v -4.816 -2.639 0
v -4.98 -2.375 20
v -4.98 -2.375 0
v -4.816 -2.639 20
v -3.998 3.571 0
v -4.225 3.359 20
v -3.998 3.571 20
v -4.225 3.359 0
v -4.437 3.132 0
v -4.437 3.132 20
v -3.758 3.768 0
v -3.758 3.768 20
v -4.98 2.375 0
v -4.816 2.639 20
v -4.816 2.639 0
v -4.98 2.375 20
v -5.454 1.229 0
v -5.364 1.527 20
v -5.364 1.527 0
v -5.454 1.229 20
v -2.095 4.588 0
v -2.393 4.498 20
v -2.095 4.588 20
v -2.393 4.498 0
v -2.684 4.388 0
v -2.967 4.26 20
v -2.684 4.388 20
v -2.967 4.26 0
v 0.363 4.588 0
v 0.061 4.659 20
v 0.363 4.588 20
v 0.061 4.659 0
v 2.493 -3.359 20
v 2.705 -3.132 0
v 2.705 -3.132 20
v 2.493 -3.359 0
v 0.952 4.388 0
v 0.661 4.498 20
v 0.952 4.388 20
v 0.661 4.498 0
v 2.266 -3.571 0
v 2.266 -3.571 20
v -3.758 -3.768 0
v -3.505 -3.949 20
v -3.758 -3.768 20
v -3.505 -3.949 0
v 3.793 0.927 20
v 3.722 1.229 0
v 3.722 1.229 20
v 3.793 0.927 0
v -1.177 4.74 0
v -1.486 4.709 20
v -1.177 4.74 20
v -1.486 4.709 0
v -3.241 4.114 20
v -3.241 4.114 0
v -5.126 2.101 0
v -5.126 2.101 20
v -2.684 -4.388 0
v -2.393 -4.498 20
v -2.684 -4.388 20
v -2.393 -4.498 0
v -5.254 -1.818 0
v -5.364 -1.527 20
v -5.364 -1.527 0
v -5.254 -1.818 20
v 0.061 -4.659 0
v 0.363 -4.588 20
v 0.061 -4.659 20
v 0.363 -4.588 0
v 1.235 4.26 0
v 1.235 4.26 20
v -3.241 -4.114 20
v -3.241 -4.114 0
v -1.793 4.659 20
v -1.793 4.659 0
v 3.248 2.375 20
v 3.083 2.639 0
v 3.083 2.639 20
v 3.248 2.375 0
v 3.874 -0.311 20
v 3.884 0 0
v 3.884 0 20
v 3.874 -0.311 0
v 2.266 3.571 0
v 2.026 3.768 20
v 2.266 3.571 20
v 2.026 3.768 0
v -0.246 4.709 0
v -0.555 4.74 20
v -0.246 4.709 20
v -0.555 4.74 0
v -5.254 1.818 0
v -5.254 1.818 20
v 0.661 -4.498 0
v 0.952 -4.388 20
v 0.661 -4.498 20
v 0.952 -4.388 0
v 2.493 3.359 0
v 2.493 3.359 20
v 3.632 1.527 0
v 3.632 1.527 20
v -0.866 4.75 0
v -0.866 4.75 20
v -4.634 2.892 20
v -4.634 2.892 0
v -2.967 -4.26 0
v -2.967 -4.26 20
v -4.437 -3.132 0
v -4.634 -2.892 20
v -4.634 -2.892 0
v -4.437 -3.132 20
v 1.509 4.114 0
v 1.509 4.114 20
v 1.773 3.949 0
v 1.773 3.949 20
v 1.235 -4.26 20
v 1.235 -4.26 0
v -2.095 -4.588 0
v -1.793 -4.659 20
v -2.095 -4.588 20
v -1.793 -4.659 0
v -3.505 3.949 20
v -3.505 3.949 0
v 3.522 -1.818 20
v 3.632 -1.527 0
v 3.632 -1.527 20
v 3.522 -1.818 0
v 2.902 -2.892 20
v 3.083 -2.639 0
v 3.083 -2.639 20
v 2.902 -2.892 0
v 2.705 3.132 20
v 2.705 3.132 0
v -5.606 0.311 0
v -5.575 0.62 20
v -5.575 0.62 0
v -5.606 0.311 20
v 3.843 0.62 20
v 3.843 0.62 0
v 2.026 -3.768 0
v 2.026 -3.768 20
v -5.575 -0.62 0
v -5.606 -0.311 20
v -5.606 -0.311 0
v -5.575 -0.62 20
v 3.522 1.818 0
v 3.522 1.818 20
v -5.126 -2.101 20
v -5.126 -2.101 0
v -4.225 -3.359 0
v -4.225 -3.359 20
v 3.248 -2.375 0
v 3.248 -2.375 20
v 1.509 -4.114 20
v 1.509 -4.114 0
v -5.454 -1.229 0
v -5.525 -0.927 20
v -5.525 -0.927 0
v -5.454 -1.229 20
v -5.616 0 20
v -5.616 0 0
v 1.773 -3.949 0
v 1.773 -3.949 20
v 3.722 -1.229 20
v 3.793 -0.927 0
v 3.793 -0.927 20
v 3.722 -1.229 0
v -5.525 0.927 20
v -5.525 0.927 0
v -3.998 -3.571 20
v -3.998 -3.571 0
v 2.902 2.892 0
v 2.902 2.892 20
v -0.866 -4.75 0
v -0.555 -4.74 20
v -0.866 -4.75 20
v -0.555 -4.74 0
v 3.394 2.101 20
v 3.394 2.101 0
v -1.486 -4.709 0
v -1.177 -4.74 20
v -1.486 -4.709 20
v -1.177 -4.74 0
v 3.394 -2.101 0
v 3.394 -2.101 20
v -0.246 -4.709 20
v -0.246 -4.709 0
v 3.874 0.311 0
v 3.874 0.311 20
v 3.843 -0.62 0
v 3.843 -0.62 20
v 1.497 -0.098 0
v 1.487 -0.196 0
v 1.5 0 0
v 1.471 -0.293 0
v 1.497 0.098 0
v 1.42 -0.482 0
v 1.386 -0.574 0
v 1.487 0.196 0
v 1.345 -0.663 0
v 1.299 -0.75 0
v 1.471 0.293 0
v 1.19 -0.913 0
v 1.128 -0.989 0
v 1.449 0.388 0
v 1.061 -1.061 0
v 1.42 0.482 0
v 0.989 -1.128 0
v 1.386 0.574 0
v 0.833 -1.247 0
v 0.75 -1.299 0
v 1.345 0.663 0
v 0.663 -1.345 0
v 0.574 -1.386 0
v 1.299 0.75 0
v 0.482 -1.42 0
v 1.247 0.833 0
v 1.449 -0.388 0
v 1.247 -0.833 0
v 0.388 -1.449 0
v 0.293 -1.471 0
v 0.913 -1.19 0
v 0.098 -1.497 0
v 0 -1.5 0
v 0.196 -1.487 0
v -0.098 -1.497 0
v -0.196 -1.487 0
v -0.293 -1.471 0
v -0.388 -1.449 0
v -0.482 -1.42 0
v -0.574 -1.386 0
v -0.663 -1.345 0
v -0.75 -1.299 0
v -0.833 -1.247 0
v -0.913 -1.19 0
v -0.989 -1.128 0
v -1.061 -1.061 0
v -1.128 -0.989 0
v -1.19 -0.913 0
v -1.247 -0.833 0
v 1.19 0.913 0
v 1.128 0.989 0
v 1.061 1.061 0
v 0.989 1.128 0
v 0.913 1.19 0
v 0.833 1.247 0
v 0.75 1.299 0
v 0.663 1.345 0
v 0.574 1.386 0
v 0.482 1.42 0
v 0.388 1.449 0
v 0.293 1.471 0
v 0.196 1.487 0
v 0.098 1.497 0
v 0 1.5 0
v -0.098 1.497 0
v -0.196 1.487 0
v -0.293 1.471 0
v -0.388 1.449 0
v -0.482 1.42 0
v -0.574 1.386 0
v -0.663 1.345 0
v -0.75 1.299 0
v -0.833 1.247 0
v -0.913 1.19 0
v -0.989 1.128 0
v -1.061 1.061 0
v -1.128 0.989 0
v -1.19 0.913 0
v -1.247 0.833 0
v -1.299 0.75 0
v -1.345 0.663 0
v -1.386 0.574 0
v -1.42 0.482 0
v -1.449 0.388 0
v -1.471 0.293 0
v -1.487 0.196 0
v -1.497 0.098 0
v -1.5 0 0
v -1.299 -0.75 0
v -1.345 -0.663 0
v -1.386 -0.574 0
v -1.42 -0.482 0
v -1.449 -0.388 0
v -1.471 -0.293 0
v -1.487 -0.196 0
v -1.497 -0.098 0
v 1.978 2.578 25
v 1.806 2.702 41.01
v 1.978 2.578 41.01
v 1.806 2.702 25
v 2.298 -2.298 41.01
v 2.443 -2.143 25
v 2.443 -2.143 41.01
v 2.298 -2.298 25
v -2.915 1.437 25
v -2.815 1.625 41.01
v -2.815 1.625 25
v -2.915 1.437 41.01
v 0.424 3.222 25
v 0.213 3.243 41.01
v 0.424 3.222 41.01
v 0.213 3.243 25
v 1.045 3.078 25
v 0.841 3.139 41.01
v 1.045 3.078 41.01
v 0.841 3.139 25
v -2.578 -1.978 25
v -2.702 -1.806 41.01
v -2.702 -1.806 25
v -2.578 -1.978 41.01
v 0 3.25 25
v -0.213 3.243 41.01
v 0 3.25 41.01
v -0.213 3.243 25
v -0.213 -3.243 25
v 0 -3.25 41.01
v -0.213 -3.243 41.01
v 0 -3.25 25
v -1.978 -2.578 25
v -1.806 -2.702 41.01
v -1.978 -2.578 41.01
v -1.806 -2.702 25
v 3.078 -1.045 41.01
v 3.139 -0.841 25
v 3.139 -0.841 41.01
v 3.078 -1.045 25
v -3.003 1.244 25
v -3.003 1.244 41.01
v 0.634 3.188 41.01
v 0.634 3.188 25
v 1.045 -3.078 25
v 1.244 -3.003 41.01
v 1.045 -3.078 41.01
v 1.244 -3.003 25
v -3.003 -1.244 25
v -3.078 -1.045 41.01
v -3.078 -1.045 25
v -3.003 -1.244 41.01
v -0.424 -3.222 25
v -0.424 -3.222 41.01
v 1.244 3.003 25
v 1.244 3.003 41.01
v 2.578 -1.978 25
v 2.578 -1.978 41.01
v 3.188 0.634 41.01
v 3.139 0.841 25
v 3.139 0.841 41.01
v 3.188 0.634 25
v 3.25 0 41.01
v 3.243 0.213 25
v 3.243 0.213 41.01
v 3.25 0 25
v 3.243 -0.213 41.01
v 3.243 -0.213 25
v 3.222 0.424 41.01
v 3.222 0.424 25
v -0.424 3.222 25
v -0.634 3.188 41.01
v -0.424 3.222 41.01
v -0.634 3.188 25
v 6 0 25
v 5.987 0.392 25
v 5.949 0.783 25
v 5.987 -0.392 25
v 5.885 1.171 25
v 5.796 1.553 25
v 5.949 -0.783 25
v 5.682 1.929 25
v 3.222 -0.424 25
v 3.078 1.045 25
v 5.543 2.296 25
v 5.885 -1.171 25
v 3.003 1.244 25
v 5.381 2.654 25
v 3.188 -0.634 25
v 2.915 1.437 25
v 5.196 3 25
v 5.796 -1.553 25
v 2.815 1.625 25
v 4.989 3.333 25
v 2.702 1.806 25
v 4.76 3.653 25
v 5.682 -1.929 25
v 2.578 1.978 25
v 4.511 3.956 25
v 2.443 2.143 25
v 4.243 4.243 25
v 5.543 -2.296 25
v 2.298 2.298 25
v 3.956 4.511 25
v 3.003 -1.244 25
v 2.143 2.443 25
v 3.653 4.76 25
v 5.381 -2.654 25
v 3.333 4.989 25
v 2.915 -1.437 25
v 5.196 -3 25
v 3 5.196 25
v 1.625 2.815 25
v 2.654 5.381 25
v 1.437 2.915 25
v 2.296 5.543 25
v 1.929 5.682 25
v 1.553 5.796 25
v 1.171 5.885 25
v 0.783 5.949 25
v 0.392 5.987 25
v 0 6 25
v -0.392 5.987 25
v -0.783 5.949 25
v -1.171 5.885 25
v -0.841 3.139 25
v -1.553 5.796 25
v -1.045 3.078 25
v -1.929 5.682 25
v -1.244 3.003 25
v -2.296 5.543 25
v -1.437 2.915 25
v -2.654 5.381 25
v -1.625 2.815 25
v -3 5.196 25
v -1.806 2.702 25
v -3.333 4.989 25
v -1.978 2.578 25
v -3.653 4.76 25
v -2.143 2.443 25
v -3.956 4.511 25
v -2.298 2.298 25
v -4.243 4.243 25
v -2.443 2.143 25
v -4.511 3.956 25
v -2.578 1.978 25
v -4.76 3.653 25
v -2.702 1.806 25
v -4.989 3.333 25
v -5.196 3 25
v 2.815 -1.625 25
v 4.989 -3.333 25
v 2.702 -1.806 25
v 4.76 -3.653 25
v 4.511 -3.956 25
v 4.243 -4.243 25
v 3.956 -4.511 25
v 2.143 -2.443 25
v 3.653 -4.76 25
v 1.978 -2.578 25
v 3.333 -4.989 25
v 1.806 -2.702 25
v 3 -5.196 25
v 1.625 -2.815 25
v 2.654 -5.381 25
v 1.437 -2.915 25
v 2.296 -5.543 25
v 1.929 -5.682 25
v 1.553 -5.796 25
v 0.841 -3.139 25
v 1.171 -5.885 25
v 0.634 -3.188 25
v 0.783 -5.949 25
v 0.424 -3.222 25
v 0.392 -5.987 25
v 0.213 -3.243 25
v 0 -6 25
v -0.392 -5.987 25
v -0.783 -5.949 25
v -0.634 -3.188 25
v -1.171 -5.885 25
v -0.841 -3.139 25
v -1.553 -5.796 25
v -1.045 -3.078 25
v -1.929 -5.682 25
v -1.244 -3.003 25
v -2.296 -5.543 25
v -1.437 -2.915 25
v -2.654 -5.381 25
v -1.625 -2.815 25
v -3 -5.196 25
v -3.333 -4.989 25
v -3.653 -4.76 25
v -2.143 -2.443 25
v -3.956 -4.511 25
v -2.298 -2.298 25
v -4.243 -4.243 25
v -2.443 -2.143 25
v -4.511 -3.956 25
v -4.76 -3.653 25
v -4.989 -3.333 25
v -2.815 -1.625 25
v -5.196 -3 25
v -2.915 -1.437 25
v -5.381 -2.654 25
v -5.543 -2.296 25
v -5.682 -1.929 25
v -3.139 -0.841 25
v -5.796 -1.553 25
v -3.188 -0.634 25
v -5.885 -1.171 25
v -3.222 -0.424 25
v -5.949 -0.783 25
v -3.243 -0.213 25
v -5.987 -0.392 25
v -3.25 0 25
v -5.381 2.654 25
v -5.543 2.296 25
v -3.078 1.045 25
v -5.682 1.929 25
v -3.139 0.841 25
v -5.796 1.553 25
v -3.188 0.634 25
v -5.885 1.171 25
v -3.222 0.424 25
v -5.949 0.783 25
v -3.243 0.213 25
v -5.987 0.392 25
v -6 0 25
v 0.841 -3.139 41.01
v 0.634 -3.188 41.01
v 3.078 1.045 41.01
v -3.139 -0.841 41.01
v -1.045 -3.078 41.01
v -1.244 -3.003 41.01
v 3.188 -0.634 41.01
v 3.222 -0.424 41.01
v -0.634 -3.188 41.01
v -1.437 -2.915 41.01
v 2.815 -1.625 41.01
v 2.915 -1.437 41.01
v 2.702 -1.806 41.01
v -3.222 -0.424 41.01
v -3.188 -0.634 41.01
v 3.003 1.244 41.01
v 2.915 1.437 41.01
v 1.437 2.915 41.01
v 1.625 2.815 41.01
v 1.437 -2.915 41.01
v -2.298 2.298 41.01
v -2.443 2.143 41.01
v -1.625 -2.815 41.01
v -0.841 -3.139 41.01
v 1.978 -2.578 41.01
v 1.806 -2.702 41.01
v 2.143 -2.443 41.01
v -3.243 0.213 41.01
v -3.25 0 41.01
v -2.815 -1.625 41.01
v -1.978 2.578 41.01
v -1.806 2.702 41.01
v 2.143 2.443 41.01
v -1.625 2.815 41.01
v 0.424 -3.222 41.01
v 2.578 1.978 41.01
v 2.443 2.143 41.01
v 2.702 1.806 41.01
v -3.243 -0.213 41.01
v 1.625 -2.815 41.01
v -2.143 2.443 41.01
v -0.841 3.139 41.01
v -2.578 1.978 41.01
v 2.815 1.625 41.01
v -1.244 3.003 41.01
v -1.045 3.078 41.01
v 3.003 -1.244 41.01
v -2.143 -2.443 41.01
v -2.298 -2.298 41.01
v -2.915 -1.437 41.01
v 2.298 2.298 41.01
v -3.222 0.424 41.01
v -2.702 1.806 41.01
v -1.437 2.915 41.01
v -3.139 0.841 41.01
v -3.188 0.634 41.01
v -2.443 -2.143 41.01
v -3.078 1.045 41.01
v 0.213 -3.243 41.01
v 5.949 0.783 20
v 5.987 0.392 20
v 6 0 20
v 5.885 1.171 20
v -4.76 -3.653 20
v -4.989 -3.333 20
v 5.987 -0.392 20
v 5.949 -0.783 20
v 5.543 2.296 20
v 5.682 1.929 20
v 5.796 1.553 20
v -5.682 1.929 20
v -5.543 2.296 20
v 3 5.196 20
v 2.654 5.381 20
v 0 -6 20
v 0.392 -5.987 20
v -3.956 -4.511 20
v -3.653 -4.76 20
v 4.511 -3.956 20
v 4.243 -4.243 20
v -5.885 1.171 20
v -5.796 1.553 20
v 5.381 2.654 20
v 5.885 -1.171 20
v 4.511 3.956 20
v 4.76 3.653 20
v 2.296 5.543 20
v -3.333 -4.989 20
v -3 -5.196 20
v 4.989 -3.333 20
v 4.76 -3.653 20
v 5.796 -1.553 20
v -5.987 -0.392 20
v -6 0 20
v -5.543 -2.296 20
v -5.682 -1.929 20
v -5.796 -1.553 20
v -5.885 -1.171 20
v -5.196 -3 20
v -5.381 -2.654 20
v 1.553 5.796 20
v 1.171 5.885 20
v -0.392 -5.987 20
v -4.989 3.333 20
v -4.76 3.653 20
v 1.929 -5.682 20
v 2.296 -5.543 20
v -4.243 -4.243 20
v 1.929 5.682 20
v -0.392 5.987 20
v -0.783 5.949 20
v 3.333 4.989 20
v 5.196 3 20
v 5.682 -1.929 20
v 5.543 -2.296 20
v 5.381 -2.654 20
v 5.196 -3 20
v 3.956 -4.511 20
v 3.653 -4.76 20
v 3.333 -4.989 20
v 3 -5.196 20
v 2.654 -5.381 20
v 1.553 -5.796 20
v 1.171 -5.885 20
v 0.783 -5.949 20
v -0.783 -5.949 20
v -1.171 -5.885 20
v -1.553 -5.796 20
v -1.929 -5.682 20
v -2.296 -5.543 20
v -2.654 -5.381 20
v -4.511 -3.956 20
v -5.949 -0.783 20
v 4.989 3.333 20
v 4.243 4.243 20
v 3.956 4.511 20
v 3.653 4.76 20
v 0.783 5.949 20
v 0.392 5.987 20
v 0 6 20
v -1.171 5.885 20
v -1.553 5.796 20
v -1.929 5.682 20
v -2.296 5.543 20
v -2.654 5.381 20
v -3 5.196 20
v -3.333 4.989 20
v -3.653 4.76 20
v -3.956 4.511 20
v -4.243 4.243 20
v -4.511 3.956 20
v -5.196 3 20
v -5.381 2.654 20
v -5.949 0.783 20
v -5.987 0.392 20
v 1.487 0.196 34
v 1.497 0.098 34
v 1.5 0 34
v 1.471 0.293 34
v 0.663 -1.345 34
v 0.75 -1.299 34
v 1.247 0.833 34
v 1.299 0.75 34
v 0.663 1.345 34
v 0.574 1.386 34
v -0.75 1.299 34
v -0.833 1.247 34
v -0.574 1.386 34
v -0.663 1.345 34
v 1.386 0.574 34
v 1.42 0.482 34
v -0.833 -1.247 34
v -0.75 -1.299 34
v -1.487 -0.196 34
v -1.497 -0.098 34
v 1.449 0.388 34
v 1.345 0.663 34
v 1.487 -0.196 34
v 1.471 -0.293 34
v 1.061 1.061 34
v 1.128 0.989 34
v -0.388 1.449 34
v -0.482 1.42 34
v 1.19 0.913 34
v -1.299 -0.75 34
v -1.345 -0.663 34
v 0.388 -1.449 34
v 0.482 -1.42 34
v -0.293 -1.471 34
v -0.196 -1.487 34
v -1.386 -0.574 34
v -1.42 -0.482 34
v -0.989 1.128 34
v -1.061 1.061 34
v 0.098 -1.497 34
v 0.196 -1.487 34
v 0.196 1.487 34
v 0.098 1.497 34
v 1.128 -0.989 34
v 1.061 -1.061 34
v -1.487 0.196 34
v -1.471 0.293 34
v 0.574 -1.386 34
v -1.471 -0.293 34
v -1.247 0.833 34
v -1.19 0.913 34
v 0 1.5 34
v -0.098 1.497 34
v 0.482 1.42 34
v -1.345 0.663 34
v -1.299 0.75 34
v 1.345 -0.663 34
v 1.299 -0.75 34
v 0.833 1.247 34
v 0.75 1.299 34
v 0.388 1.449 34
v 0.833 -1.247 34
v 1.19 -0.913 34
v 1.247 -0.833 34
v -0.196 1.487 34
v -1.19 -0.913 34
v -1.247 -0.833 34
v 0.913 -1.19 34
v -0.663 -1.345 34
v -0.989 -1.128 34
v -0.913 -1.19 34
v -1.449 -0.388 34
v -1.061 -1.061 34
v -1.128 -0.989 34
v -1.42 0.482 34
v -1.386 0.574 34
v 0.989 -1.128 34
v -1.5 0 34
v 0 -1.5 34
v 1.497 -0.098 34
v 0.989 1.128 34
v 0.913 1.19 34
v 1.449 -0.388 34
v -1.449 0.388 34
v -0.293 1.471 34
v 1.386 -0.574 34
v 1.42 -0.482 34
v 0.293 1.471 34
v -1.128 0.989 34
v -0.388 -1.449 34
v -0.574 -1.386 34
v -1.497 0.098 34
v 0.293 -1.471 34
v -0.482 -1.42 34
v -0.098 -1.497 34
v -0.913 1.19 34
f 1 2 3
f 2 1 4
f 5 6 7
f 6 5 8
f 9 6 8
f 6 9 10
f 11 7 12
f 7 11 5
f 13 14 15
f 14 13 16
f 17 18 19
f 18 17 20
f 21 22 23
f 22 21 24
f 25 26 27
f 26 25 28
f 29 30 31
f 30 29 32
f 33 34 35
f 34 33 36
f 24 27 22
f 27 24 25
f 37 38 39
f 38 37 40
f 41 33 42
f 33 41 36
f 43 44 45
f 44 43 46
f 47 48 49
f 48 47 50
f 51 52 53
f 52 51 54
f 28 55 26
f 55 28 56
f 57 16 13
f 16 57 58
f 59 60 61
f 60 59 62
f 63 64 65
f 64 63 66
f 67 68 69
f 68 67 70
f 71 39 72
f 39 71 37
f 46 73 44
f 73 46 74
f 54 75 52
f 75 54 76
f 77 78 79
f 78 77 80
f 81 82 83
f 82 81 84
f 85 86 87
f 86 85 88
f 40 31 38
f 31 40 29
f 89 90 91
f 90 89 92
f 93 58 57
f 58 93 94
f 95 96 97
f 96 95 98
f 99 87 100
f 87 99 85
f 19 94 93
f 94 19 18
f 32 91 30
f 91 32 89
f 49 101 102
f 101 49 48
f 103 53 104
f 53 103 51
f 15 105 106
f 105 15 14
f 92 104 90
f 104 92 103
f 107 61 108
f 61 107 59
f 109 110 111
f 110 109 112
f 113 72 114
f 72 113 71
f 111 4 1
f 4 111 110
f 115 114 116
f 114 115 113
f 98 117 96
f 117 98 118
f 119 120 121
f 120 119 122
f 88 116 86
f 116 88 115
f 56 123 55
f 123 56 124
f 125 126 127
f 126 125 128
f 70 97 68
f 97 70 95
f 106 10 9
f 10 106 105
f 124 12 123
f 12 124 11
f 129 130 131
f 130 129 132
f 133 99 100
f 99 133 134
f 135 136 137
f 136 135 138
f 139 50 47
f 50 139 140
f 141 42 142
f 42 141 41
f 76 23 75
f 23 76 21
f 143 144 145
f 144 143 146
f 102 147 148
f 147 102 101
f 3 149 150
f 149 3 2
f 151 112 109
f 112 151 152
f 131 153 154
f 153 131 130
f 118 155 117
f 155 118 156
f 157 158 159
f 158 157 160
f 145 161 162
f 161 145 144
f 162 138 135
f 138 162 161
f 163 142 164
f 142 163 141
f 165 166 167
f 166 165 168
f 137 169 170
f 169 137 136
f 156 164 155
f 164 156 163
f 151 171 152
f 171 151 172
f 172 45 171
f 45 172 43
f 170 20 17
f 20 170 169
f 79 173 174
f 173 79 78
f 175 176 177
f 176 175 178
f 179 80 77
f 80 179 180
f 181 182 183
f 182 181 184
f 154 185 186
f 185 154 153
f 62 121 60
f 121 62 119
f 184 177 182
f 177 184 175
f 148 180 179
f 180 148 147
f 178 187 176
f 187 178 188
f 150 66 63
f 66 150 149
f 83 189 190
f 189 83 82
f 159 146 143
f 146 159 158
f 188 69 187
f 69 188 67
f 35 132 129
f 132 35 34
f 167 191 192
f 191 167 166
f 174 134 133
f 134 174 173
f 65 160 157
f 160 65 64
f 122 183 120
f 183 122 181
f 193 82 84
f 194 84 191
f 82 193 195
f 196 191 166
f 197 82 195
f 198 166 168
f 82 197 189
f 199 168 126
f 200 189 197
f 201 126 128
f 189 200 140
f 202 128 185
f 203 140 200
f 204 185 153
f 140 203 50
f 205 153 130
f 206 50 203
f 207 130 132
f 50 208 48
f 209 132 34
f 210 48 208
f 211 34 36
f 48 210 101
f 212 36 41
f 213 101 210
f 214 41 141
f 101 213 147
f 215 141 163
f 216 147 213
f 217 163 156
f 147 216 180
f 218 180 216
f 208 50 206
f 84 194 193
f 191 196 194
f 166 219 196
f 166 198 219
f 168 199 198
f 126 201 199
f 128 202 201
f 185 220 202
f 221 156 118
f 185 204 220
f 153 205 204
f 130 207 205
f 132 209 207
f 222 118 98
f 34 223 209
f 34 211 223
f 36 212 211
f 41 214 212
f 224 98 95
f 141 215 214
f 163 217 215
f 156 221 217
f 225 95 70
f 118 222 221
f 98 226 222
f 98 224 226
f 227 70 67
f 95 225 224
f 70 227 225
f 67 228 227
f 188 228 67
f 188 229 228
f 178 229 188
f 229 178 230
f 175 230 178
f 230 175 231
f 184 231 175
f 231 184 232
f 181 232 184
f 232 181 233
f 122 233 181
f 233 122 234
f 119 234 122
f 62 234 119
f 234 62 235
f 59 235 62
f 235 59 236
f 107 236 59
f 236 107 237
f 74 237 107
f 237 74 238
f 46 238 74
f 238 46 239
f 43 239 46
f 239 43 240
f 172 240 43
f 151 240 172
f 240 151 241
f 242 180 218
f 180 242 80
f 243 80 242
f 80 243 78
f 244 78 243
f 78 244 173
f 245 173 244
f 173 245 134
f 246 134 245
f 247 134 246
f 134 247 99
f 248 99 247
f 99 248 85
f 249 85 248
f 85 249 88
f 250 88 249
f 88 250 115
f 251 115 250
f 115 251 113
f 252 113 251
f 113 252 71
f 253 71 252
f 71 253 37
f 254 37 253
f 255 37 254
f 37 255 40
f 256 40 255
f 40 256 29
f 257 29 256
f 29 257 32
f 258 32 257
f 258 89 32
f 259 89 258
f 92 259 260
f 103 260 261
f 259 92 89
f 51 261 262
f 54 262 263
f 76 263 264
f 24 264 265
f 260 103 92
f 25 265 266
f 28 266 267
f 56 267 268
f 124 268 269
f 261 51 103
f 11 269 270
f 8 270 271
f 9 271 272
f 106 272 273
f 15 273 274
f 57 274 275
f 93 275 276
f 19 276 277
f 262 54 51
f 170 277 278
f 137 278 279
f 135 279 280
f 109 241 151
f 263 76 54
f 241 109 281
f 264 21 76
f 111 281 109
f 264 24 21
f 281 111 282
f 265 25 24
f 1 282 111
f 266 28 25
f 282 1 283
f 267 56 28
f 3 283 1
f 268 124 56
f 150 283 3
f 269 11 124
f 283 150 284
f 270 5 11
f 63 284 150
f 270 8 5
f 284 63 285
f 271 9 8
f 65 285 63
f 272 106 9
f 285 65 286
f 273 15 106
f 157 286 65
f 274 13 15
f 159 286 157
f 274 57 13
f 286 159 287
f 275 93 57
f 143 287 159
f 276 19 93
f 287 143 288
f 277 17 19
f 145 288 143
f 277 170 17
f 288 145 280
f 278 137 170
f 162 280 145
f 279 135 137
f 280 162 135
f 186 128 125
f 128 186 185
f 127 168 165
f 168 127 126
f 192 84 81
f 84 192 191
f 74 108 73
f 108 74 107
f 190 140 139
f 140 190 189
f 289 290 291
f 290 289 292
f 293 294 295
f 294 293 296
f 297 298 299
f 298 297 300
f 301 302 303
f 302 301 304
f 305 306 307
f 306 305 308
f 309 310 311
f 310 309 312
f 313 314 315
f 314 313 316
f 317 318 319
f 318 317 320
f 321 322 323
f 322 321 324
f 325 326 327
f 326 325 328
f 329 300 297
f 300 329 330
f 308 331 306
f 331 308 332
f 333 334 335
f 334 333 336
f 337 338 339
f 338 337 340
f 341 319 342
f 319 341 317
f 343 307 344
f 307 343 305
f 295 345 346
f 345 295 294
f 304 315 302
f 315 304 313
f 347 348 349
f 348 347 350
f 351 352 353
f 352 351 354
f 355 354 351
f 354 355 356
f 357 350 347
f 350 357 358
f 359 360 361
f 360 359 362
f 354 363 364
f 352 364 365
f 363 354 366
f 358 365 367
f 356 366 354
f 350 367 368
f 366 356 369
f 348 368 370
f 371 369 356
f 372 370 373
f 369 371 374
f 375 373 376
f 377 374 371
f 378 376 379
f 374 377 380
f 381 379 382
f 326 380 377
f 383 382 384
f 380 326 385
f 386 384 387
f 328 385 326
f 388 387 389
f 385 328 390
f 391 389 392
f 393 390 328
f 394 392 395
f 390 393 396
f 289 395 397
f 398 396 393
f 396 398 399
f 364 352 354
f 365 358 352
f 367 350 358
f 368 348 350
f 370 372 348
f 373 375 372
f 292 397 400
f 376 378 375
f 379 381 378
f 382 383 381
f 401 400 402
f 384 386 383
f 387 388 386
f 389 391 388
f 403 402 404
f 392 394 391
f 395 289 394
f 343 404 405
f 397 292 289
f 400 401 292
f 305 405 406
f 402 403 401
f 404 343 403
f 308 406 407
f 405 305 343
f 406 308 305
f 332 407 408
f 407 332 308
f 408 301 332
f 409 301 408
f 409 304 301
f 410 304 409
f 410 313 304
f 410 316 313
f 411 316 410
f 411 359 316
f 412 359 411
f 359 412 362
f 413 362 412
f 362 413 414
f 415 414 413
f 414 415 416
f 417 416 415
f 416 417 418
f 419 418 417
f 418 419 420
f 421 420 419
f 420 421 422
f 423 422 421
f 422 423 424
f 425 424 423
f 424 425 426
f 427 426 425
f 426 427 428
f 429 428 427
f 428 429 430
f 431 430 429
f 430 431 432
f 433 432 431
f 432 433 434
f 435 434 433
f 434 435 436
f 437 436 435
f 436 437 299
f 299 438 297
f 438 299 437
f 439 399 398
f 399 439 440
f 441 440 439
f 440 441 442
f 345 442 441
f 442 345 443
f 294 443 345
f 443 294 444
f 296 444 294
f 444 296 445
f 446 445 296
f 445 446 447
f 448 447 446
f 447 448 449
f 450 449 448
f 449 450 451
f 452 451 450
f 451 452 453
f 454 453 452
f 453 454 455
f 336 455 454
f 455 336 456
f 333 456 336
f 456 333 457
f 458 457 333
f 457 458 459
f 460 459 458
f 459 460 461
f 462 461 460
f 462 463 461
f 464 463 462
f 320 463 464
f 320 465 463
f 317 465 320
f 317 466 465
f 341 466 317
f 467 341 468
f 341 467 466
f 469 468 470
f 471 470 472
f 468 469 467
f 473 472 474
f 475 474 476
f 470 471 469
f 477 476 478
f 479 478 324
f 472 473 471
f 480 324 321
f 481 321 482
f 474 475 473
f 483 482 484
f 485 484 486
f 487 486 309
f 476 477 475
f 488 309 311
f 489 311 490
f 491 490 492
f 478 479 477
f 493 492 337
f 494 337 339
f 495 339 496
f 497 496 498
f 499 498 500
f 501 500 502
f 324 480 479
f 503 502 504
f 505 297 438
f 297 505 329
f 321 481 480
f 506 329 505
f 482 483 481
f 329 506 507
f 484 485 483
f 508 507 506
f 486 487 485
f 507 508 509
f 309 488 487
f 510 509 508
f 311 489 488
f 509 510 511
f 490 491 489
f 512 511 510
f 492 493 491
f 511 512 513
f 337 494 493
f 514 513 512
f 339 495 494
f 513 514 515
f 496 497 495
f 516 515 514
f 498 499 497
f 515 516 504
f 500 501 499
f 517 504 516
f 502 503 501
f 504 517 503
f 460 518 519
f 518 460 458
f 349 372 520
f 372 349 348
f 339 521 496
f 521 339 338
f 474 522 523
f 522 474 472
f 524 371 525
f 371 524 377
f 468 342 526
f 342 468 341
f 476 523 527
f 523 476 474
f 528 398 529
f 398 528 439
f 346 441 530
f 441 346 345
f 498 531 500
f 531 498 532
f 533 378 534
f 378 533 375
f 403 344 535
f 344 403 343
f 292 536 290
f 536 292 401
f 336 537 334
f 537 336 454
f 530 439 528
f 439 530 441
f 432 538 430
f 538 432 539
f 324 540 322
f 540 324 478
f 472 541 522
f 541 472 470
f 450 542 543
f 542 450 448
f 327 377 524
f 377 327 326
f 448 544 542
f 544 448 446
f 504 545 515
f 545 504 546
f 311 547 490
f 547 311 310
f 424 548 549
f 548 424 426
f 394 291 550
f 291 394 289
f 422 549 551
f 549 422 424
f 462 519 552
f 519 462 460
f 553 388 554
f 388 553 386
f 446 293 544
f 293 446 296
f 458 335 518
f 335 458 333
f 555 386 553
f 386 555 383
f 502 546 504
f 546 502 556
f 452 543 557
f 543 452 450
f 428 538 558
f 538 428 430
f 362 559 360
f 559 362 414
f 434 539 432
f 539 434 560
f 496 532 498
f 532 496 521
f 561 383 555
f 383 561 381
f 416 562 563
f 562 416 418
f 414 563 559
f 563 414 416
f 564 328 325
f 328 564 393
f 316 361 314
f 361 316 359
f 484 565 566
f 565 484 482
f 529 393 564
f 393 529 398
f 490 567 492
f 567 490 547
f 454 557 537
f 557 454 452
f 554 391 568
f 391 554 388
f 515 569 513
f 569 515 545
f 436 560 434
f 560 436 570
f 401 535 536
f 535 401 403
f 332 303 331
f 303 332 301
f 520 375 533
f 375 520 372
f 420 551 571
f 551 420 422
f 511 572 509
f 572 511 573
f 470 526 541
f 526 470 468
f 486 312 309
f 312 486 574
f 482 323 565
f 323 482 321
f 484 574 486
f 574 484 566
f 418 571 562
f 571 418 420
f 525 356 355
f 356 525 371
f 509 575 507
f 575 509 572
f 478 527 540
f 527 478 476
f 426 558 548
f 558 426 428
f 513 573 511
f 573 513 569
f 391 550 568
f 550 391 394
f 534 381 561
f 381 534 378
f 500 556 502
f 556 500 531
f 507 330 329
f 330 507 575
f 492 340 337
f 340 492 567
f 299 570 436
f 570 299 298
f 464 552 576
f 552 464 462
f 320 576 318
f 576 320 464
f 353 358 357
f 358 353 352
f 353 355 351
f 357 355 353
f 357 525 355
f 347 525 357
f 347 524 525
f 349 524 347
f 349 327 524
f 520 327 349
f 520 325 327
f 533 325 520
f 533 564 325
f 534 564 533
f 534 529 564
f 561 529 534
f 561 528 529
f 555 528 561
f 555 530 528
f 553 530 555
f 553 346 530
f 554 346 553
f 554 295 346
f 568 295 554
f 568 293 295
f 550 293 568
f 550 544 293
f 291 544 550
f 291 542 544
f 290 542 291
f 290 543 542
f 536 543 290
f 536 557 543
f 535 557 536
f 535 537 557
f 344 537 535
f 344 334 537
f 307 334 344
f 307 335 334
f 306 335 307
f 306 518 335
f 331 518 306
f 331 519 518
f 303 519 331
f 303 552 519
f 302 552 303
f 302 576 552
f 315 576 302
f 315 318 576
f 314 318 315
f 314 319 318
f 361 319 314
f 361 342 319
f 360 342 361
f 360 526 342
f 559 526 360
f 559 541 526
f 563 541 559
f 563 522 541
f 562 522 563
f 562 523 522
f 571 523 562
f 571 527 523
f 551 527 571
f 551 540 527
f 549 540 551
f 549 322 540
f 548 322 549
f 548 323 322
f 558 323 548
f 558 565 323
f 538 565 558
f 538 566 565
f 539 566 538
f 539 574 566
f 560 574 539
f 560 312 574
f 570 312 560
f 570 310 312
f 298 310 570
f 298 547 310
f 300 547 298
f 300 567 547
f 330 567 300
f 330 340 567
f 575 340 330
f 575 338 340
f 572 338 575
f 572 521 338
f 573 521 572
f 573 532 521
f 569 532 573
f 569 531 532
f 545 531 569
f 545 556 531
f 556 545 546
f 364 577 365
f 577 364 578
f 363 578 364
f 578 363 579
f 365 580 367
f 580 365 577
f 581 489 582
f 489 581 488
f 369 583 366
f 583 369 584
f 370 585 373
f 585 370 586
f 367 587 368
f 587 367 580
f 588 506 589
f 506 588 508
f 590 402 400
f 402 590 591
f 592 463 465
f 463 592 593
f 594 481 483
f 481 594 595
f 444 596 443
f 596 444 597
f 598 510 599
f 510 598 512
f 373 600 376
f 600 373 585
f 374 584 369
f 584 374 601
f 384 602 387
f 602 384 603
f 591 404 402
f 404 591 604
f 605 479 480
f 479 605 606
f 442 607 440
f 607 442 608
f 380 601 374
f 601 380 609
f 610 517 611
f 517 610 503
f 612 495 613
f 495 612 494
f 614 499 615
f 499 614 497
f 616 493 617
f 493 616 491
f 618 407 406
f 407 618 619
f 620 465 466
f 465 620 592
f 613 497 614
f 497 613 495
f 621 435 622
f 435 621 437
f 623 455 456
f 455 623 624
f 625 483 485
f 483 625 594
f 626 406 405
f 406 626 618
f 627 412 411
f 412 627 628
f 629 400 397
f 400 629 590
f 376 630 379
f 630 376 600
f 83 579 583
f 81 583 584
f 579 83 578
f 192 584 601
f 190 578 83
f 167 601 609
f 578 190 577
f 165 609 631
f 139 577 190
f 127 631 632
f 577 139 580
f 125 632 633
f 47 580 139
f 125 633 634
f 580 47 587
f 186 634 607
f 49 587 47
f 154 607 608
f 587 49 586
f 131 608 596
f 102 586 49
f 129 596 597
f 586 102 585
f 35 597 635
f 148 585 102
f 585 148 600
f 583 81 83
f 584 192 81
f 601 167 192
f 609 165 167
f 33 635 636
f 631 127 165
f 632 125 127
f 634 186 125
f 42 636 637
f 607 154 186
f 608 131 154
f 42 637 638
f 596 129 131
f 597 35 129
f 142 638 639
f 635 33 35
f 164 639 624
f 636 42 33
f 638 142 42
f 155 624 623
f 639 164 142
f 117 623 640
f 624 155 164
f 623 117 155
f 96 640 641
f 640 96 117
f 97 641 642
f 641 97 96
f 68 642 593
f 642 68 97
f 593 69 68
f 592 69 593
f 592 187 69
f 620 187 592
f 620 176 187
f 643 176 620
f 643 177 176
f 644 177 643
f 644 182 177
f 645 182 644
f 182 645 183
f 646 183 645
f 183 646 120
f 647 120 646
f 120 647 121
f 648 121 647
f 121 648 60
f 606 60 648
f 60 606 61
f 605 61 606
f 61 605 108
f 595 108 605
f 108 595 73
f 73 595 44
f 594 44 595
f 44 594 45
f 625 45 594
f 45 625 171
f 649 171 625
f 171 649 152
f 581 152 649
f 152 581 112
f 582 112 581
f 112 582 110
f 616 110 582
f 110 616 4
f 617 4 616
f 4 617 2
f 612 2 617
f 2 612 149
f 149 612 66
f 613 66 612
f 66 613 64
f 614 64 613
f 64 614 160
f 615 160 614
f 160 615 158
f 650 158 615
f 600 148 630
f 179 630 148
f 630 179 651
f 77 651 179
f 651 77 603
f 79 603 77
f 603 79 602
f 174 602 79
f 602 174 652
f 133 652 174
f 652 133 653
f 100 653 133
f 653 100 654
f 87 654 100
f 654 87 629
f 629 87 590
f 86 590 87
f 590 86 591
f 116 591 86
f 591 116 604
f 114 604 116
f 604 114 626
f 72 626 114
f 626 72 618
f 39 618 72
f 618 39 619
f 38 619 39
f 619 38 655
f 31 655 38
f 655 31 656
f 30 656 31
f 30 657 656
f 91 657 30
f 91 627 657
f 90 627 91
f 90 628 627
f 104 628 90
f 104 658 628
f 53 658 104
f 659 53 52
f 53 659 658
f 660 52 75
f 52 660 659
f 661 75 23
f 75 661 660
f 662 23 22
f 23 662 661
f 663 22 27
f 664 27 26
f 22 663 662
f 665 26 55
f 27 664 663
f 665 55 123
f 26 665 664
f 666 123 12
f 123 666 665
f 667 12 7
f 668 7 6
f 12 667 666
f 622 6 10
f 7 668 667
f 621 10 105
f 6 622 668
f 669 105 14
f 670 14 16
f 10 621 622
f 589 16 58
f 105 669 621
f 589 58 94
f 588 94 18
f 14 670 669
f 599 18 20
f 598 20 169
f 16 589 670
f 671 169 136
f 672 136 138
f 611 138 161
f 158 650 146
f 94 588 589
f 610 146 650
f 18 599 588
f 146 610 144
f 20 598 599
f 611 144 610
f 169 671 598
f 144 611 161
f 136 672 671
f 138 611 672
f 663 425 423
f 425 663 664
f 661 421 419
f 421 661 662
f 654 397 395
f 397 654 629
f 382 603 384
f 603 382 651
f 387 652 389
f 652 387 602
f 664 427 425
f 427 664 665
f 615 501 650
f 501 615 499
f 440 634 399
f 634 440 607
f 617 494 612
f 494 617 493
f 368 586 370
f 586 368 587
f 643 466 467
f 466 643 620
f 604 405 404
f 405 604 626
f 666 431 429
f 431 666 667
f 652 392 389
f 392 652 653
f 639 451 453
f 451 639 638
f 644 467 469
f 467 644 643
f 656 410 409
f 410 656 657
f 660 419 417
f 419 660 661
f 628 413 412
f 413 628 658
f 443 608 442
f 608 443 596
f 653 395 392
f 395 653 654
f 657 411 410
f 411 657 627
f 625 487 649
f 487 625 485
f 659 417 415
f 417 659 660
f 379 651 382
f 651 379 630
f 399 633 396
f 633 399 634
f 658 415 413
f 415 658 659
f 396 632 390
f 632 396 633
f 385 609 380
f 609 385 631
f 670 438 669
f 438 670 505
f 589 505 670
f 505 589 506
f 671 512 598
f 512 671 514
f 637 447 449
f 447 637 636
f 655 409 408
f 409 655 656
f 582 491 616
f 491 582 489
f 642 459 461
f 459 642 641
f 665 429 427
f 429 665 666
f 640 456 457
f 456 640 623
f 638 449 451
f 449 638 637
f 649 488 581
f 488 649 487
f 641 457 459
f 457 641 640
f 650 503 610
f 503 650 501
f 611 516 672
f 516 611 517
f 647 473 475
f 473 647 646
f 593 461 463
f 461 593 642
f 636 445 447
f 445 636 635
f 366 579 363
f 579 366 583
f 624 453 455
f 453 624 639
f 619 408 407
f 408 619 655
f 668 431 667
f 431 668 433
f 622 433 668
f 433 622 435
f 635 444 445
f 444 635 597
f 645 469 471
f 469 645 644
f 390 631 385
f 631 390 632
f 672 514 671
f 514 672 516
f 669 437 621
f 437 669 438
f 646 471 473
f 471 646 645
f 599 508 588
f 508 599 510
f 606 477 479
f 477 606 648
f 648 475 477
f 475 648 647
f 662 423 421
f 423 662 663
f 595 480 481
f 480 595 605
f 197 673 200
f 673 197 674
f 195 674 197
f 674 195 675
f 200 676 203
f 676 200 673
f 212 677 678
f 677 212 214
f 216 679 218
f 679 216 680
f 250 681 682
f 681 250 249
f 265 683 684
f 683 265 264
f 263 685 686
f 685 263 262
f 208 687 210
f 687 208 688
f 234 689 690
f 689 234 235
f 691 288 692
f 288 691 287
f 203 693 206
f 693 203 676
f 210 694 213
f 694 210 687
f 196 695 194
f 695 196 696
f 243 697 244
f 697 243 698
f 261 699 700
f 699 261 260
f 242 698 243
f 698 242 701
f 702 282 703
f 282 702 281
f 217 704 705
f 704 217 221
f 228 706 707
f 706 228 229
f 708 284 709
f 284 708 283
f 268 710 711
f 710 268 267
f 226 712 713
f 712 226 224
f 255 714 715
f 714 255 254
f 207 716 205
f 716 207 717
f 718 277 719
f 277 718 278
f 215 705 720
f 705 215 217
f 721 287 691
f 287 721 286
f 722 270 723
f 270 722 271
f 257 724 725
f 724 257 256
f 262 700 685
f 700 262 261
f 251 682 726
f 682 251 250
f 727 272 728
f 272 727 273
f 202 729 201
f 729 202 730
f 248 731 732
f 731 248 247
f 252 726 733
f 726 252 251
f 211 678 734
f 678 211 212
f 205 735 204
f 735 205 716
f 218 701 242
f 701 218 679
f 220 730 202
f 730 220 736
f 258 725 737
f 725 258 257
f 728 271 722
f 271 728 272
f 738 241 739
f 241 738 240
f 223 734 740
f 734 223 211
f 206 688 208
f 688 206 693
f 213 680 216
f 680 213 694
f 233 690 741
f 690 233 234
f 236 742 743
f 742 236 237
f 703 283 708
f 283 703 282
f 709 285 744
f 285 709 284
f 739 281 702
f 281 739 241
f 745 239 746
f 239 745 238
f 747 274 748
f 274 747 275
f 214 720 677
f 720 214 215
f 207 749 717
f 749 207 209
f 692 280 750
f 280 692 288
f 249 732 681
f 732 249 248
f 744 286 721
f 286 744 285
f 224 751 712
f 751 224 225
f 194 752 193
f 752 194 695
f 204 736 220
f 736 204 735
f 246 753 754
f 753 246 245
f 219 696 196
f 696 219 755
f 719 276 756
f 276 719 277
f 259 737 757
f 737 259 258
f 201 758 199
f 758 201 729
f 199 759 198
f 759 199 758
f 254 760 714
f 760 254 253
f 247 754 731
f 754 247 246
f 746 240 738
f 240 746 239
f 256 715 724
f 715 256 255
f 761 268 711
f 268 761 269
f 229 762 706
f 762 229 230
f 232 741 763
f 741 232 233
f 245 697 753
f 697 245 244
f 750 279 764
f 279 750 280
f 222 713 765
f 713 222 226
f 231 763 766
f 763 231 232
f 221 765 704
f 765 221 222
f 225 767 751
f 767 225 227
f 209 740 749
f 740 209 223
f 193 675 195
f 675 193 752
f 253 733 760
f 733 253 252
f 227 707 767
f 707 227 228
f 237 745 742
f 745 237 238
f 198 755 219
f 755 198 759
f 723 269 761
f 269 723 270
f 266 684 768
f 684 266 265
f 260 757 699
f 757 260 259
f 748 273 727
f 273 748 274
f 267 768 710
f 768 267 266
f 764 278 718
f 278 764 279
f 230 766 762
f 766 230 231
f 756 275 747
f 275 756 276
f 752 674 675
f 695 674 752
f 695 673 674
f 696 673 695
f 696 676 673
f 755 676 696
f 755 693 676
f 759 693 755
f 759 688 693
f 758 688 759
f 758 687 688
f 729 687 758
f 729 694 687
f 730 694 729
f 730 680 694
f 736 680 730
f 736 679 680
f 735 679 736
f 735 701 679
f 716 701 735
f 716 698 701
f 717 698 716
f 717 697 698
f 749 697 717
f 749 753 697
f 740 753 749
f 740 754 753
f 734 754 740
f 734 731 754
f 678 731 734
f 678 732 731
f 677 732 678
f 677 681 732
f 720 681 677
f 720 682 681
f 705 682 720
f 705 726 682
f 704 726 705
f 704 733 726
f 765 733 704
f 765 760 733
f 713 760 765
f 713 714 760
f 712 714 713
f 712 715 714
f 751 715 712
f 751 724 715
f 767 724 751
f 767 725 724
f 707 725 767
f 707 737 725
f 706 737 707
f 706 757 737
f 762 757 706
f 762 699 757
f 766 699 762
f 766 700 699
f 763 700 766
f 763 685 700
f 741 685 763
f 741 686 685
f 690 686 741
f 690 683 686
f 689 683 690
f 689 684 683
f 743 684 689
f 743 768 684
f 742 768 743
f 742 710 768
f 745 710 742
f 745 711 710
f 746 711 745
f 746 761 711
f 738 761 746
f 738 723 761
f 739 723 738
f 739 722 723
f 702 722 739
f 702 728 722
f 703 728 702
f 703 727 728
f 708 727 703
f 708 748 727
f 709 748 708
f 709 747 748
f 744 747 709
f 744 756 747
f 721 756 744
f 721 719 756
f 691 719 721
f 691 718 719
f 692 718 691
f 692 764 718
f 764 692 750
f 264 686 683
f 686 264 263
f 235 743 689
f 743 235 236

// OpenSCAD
// Hose-barb reducer: joins 8 mm ID tubing to 5 mm ID tubing
// Print orientation: standing upright along Z

$fn = 96;

// ---- 8 mm tubing barbs (z = 0 to 20) ----
barb_h_8 = 20;
barb_od_bottom_8 = 7.5;
barb_od_top_8 = 9.5;

// ---- 5 mm tubing barbs (z = 25 to 41) ----
barb_h_5 = 8;
barb_od_bottom_5 = 6.5;
barb_od_top_5 = 5.0;

// ---- Collar (z = 20 to 25) ----
collar_od = 12;

// ---- Through bore ----
bore = 3;

// ---- Derived ----
collar_h = 5;
overlap = 0.01;

module barb(h, od_bottom, od_top) {
    // Sawtooth profile: grow linearly, then step straight back to bottom diameter
    len = (od_top - od_bottom) / 2 / tan(30);  // 30 deg flank
    hull() {
        translate([0, 0, 0]) cylinder(h = h + overlap, d = od_bottom);
        translate([0, 0, h - overlap]) cylinder(h = overlap, d = od_bottom);
        for (s = [-1, 1])
            rotate([0, 0, s * 180])
                translate([len / 2, 0, 0])
                    linear_extrude(height = h + overlap)
                        circle(d = od_top);
    }
}

difference() {
    union() {
        // 8 mm barbs
        for (z = [0, barb_h_8 / 2])
            translate([0, 0, z]) barb(h = barb_h_8 / 2 + overlap, od_bottom = barb_od_bottom_8, od_top = barb_od_top_8);

        // Collar
        translate([0, 0, 20]) cylinder(h = collar_h, d = collar_od);

        // 5 mm barbs
        for (z = [25, 41 - 16 / 2])
            translate([0, 0, z]) barb(h = barb_h_5, od_bottom = barb_od_bottom_5, od_top = barb_od_top_5);
    }

    // Through bore
    translate([0, 0, -1]) cylinder(h = barb_h_8 + collar_h + barb_h_5 + 2, d = bore);
}
